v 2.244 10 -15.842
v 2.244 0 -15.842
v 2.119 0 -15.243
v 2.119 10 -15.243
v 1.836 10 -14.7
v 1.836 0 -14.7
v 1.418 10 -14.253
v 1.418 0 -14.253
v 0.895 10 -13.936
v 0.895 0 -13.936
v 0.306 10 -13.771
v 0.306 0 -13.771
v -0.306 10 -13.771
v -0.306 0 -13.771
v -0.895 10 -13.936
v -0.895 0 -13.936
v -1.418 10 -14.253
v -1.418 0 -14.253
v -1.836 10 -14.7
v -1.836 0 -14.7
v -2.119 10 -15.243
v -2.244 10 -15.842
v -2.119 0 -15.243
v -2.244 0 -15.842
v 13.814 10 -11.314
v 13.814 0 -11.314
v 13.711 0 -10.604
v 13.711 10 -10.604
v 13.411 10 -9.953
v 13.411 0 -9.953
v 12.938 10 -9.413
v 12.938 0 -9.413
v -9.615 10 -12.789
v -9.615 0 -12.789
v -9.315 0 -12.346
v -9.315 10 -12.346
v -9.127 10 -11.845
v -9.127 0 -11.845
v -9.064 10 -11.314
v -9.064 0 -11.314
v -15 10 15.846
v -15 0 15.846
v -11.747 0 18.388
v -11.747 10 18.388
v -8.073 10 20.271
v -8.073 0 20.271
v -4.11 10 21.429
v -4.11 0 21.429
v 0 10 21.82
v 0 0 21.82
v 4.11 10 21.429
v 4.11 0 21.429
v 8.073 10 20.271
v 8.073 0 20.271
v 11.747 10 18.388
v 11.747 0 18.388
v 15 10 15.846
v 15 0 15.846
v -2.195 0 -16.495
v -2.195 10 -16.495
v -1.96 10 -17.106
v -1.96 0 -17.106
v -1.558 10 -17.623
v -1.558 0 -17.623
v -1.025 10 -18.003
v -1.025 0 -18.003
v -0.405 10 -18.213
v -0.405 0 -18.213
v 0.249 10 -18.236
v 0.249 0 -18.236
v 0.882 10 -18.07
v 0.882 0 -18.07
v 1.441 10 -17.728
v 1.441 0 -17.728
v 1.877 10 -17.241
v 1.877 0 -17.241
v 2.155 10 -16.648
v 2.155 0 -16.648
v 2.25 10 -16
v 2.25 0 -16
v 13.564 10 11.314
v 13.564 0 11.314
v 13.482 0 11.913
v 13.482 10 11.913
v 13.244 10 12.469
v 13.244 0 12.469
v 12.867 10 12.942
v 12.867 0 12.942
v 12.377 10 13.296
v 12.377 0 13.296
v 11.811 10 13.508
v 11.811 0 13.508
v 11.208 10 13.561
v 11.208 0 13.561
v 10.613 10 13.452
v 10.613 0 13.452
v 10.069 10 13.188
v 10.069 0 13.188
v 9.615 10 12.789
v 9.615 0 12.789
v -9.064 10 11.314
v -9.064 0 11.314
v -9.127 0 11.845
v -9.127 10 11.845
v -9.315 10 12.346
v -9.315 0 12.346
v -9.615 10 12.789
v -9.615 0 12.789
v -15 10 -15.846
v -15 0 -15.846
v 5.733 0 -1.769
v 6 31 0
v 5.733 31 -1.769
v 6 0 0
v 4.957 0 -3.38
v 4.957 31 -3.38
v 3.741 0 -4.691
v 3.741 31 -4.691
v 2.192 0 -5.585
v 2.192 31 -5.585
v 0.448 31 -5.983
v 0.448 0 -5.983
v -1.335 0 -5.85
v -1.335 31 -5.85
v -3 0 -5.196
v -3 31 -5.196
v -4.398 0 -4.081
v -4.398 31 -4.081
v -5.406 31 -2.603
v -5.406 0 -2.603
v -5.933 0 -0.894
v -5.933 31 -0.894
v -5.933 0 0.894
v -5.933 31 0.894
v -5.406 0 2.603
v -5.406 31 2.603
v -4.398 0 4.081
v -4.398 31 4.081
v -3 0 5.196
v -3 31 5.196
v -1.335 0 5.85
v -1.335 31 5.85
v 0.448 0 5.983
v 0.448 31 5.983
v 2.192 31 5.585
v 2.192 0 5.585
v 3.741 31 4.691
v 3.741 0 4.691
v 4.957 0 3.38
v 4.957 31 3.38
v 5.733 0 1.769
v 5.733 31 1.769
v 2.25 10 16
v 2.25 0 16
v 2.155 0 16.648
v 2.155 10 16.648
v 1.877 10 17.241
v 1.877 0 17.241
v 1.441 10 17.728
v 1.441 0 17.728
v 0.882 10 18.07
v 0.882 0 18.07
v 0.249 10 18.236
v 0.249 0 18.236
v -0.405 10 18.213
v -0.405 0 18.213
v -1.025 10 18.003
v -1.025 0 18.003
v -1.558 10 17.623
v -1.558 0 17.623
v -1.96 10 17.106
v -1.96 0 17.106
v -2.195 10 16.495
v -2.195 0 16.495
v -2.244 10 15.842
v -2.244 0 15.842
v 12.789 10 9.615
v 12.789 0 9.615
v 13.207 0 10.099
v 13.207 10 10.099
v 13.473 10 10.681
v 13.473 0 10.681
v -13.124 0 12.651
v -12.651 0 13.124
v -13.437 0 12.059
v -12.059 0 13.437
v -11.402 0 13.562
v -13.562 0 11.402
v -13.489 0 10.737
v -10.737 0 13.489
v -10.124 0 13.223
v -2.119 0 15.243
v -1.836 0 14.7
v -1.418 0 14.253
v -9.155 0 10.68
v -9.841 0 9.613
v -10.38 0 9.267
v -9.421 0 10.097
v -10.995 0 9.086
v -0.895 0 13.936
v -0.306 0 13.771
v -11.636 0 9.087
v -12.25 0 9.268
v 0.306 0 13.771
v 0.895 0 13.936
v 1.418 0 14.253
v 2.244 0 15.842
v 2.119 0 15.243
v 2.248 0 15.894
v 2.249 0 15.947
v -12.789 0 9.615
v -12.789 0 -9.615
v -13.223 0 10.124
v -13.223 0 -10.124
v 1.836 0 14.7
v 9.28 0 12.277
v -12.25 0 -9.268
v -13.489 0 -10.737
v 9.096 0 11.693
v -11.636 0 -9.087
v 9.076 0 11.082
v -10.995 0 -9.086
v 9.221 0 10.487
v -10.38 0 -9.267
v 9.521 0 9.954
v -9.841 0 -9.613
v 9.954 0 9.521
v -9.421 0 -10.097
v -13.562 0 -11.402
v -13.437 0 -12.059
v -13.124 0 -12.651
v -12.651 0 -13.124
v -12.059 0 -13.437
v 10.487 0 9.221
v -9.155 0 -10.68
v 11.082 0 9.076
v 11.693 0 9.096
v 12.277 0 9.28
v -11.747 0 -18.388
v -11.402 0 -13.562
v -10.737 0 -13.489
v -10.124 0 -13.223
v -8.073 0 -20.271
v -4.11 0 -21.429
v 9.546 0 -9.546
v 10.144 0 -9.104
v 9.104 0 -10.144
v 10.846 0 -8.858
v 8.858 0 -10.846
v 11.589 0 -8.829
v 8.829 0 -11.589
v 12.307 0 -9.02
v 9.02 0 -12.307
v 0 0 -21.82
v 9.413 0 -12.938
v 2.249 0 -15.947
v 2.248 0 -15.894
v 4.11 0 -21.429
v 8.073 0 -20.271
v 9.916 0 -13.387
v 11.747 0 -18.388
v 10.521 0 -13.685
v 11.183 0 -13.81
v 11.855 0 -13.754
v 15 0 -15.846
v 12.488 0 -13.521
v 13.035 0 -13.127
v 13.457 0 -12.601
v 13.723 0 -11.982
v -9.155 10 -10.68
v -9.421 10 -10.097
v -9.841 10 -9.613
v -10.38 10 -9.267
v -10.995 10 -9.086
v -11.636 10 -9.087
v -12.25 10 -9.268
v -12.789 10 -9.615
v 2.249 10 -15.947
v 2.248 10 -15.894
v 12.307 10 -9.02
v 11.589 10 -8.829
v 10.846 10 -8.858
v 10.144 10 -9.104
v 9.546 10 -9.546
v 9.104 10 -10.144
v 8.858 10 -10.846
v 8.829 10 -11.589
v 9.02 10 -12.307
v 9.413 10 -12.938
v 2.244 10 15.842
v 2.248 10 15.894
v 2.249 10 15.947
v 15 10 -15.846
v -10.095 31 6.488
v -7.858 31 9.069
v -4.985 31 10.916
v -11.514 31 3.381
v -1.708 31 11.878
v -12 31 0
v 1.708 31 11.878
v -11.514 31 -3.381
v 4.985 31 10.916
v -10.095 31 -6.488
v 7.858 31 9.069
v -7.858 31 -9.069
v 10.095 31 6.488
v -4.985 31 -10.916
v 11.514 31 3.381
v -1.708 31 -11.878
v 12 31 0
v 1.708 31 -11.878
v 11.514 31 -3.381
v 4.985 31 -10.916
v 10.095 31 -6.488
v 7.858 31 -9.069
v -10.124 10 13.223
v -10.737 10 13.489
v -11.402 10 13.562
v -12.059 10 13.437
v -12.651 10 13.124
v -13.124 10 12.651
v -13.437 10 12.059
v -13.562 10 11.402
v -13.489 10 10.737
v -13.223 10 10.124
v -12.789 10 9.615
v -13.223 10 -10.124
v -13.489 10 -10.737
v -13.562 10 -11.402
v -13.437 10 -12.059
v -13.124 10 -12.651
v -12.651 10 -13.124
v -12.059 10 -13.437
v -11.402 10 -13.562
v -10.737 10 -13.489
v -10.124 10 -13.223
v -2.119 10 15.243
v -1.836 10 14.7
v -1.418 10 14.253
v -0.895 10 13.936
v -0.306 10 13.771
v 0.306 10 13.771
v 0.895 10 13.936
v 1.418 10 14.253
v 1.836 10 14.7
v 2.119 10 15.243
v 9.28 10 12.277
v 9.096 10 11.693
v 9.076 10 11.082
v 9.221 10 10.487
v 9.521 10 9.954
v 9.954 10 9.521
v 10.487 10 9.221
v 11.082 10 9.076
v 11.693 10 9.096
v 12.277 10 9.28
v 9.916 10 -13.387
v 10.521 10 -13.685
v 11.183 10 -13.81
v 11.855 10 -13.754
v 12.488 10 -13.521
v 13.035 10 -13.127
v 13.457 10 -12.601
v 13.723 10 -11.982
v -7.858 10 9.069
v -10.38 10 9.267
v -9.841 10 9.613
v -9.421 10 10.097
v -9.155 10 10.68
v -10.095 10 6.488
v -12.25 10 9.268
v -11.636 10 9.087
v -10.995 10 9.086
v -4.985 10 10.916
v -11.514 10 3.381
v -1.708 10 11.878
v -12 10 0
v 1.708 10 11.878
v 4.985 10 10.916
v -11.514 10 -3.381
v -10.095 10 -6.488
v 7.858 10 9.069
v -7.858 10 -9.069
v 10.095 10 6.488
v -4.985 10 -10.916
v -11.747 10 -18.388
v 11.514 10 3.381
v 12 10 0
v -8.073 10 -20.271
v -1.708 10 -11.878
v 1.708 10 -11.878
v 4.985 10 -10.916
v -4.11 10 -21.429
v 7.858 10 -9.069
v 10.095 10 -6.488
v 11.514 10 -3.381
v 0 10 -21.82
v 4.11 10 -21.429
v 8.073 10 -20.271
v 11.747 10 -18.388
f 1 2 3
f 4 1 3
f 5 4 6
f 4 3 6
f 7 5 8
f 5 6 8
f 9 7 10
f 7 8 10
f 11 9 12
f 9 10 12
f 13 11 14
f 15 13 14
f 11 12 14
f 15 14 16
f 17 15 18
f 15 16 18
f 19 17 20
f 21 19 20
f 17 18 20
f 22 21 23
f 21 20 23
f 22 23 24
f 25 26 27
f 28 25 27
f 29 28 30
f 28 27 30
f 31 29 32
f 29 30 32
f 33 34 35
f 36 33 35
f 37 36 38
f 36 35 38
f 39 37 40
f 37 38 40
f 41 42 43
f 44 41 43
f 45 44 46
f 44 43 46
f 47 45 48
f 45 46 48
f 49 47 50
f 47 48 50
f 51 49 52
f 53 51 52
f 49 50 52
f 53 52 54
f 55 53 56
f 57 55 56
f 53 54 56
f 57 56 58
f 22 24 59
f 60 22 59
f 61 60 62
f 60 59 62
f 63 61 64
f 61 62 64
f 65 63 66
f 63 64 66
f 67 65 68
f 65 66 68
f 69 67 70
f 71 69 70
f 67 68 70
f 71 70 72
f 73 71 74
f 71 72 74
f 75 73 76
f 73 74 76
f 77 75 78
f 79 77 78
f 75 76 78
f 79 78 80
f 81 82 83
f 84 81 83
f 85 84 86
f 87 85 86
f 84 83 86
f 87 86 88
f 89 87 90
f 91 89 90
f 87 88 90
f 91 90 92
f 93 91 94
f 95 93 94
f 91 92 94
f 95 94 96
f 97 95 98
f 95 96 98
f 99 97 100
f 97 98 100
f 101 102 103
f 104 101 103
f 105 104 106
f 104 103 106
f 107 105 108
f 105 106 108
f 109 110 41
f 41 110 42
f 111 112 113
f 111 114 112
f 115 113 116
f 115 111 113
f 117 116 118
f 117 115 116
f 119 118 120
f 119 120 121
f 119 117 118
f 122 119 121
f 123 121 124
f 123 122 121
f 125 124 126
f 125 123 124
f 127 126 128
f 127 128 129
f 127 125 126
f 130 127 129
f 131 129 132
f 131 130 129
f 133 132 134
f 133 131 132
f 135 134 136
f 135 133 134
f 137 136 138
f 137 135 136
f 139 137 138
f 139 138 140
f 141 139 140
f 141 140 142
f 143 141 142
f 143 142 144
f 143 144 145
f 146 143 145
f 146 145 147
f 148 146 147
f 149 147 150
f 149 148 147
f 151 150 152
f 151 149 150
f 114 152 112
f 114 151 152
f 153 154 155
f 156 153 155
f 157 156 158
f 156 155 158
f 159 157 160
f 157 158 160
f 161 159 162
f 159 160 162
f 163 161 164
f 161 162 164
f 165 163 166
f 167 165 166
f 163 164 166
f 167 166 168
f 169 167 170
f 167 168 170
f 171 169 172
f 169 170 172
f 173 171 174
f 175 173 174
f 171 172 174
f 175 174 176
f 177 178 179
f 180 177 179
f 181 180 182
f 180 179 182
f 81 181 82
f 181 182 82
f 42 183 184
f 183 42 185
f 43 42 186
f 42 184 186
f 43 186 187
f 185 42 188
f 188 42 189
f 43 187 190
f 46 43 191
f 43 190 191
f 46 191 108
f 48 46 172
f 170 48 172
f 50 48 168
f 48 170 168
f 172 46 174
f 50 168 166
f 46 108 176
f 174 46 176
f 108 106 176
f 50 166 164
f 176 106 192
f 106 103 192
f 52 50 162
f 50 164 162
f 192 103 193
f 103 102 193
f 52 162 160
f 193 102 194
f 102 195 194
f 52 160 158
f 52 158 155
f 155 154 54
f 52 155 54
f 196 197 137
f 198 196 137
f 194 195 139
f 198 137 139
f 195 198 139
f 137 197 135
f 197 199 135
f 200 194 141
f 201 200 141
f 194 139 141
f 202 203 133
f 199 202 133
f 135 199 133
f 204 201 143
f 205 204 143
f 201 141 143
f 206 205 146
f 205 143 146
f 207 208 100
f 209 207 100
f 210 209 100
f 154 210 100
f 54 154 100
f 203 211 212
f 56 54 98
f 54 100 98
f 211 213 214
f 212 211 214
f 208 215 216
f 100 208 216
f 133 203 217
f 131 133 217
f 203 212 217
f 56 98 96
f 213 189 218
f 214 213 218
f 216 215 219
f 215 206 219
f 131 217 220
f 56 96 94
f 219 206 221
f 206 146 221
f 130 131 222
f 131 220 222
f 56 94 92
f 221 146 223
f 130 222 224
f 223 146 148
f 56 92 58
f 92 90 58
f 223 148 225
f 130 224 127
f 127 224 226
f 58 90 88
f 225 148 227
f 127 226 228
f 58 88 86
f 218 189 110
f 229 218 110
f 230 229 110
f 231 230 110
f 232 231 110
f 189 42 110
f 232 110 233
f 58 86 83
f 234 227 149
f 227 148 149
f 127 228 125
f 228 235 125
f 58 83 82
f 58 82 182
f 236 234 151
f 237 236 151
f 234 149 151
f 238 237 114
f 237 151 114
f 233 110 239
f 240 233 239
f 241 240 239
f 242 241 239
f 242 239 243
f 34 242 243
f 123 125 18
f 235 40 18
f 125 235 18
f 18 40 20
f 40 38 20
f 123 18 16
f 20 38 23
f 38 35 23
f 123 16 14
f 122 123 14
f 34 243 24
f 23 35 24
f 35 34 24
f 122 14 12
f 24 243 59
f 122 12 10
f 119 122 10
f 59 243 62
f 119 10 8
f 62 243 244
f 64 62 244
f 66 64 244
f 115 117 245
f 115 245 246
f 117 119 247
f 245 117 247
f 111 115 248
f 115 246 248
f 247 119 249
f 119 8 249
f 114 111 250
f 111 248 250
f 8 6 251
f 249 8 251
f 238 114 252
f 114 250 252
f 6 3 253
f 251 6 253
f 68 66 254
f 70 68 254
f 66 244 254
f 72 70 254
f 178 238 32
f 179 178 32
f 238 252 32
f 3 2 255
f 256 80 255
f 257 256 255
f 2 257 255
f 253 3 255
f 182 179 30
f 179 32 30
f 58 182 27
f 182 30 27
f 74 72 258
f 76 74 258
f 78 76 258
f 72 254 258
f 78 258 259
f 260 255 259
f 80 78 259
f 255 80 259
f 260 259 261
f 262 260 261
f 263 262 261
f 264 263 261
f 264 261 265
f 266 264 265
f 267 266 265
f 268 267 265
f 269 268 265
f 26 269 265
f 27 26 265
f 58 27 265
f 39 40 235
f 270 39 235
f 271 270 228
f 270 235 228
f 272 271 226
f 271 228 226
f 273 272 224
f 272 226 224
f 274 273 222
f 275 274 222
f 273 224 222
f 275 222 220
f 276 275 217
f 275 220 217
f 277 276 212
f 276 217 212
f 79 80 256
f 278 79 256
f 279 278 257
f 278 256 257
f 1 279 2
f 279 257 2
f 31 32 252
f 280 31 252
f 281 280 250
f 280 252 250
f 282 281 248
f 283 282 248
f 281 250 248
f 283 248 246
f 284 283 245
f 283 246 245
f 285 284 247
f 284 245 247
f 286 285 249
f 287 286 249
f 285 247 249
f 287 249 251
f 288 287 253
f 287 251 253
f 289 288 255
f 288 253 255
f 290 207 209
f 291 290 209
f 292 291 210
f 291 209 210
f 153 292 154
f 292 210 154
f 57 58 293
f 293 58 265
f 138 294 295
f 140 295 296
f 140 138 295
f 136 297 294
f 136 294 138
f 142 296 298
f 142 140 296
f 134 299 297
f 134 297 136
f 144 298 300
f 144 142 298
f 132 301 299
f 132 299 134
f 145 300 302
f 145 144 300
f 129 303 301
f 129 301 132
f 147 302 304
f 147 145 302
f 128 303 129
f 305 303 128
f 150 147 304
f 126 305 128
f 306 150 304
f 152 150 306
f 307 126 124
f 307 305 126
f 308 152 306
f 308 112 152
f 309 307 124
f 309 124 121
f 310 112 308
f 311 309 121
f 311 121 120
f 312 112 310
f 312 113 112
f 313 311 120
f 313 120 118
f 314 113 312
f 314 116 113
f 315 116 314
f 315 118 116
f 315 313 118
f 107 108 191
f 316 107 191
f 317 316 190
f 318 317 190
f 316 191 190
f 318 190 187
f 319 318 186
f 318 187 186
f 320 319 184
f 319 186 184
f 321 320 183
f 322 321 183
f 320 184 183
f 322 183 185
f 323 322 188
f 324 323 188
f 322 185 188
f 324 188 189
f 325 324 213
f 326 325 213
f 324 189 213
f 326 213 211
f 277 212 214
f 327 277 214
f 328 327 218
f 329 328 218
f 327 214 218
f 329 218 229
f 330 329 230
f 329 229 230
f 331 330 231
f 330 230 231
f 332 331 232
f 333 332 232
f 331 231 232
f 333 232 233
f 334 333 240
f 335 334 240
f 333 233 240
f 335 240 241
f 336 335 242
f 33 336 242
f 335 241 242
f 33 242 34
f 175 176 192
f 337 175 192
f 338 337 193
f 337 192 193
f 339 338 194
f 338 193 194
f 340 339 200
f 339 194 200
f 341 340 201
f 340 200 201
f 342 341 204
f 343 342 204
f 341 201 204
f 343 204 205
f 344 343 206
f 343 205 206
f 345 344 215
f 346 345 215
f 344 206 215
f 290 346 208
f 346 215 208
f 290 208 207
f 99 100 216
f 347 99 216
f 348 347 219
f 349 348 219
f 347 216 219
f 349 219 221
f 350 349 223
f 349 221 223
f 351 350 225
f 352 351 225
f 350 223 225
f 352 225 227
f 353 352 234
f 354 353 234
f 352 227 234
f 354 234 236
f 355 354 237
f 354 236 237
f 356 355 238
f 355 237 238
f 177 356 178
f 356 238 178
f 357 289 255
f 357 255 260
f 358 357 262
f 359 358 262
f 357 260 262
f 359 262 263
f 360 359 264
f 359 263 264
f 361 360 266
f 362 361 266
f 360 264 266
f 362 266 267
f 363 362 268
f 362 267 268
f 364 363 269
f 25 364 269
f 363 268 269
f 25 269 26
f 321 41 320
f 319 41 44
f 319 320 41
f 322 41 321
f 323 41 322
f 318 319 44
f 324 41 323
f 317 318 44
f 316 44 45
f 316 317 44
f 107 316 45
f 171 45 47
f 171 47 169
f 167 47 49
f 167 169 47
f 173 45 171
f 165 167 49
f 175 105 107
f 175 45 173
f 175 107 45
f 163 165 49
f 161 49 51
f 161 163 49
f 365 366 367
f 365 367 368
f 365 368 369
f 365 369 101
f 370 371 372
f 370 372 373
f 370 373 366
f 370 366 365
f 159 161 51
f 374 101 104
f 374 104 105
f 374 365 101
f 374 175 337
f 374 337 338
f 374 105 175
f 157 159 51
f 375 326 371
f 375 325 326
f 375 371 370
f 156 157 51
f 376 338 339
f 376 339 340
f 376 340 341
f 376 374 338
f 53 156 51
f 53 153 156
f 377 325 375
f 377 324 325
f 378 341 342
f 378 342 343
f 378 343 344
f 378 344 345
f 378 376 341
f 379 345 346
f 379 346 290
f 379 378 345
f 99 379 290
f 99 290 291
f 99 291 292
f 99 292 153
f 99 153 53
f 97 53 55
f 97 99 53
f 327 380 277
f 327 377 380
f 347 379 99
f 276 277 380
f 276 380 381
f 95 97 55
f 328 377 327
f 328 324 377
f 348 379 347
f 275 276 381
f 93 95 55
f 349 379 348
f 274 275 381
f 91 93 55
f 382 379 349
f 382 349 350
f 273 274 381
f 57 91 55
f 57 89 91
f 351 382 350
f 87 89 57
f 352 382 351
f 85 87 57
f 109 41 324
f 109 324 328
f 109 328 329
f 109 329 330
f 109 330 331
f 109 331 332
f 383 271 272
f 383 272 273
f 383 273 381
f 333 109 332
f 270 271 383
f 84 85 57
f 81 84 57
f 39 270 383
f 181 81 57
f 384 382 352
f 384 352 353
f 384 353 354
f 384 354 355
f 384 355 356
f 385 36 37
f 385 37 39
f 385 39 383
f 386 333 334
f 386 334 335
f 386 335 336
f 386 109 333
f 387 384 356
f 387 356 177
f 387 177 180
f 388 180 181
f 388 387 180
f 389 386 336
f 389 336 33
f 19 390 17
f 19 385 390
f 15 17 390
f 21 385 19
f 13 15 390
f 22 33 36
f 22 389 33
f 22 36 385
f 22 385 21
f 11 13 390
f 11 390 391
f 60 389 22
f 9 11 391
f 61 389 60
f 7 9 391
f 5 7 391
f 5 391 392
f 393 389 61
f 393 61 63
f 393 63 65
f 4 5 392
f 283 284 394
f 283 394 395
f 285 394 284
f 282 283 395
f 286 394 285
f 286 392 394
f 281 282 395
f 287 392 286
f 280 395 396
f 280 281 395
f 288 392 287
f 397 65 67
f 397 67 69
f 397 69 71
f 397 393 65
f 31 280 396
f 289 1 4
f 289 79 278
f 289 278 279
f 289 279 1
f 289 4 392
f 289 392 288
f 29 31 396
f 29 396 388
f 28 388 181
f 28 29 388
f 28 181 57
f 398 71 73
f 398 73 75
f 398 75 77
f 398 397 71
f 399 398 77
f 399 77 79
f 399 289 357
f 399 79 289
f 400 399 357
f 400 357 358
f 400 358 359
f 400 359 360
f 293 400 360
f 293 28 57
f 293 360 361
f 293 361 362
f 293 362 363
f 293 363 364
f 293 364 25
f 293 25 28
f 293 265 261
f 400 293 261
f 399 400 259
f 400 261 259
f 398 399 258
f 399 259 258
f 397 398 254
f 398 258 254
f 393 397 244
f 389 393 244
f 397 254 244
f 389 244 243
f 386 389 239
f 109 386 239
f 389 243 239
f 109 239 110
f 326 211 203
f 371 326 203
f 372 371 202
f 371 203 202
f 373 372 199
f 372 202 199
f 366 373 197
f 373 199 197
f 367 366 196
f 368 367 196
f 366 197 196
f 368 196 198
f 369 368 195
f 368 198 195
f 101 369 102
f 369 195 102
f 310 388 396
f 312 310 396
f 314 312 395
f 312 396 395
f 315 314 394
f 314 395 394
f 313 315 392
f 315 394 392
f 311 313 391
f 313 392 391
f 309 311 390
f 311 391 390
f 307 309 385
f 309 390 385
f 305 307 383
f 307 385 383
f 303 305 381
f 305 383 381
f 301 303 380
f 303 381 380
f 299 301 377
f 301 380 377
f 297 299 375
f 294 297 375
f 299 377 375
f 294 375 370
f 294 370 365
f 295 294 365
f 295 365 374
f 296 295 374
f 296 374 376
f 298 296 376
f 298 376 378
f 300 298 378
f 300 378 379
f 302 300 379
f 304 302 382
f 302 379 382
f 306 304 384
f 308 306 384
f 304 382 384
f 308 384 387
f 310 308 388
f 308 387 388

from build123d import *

# Parameters (mm, degrees)
SKETCH_1_R      = 6
EXTRUDE_1_DEPTH = 10
SKETCH_3_R      = 12
SKETCH_3_R_2    = 6
EXTRUDE_2_DEPTH = 21


with BuildPart() as part:
    # 草图1 → 凸台-拉伸1 (new body)
    with BuildSketch(Plane(origin=(0, 0, 0), x_dir=(1, 0, 0), z_dir=(0, 1, 0))):
        with BuildLine():
            ThreePointArc((-12.788894575, 9.614789418), (-14.041020916, 7.671357874), (-15, 5.567764363))
            Line((-15, 5.567764363), (-15, -5.567764363))
            ThreePointArc((-15, -5.567764363), (-14.041020916, -7.671357874), (-12.788894575, -9.614789418))
            ThreePointArc((-12.788894575, -9.614789418), (-10.380078131, -9.26655576), (-9.063708499, -11.313708499))
            ThreePointArc((-9.063708499, -11.313708499), (-9.205976551, -12.101087718), (-9.614789418, -12.788894575))
            ThreePointArc((-9.614789418, -12.788894575), (-6.122934918, -14.78207252), (-2.24443128, -15.841796875))
            ThreePointArc((-2.24443128, -15.841796875), (0, -13.75), (2.24443128, -15.841796875))
            ThreePointArc((2.24443128, -15.841796875), (6.122934918, -14.78207252), (9.614789418, -12.788894575))
            ThreePointArc((9.614789418, -12.788894575), (9.722718241, -9.722718241), (12.788894575, -9.614789418))
            ThreePointArc((12.788894575, -9.614789418), (14.041020916, -7.671357874), (15, -5.567764363))
            Line((15, -5.567764363), (15, 5.567764363))
            ThreePointArc((15, 5.567764363), (14.100687822, 7.561124451), (12.937965605, 9.413237806))
            ThreePointArc((12.937965605, 9.413237806), (9.545941546, 9.545941546), (9.413237806, 12.937965605))
            ThreePointArc((9.413237806, 12.937965605), (6.006943578, 14.829586267), (2.24443128, 15.841796875))
            ThreePointArc((2.24443128, 15.841796875), (0, 13.75), (-2.24443128, 15.841796875))
            ThreePointArc((-2.24443128, 15.841796875), (-6.122934918, 14.78207252), (-9.614789418, 12.788894575))
            ThreePointArc((-9.614789418, 12.788894575), (-9.205976551, 12.101087718), (-9.063708499, 11.313708499))
            ThreePointArc((-9.063708499, 11.313708499), (-10.380078131, 9.26655576), (-12.788894575, 9.614789418))
        make_face()
        Circle(SKETCH_1_R, mode=Mode.SUBTRACT)
        with BuildLine():
            Line((-15, -5.567764363), (-15, -15.84625977))
            ThreePointArc((-15, -15.84625977), (0, -21.819806339), (15, -15.84625977))
            Line((15, -15.84625977), (15, -5.567764363))
            ThreePointArc((15, -5.567764363), (14.041020916, -7.671357874), (12.788894575, -9.614789418))
            ThreePointArc((12.788894575, -9.614789418), (13.360861238, -10.380078131), (13.563708499, -11.313708499))
            ThreePointArc((13.563708499, -11.313708499), (12.101087718, -13.421440447), (9.614789418, -12.788894575))
            ThreePointArc((9.614789418, -12.788894575), (6.122934918, -14.78207252), (2.24443128, -15.841796875))
            ThreePointArc((2.24443128, -15.841796875), (2.248607389, -15.920849448), (2.25, -16))
            ThreePointArc((2.25, -16), (-0.079150552, -18.248607389), (-2.24443128, -15.841796875))
            ThreePointArc((-2.24443128, -15.841796875), (-6.122934918, -14.78207252), (-9.614789418, -12.788894575))
            ThreePointArc((-9.614789418, -12.788894575), (-12.904698757, -12.904698757), (-12.788894575, -9.614789418))
            ThreePointArc((-12.788894575, -9.614789418), (-14.041020916, -7.671357874), (-15, -5.567764363))
        make_face()
        with BuildLine():
            ThreePointArc((15, 15.84625977), (0, 21.819806339), (-15, 15.84625977))
            Line((-15, 15.84625977), (-15, 5.567764363))
            ThreePointArc((-15, 5.567764363), (-14.041020916, 7.671357874), (-12.788894575, 9.614789418))
            ThreePointArc((-12.788894575, 9.614789418), (-12.904698757, 12.904698757), (-9.614789418, 12.788894575))
            ThreePointArc((-9.614789418, 12.788894575), (-6.122934918, 14.78207252), (-2.24443128, 15.841796875))
            ThreePointArc((-2.24443128, 15.841796875), (-0.079150552, 18.248607389), (2.25, 16))
            ThreePointArc((2.25, 16), (2.248607389, 15.920849448), (2.24443128, 15.841796875))
            ThreePointArc((2.24443128, 15.841796875), (6.006943578, 14.829586267), (9.413237806, 12.937965605))
            ThreePointArc((9.413237806, 12.937965605), (12.179394143, 13.659041816), (13.813708499, 11.313708499))
            ThreePointArc((13.813708499, 11.313708499), (13.584241781, 10.267439596), (12.937965605, 9.413237806))
            ThreePointArc((12.937965605, 9.413237806), (14.100687822, 7.561124451), (15, 5.567764363))
            Line((15, 5.567764363), (15, 15.84625977))
        make_face()
    extrude(amount=EXTRUDE_1_DEPTH)

    # 草图3 → 凸台-拉伸2 (add)
    with BuildSketch(Plane(origin=(0, 10, 0), x_dir=(1, 0, 0), z_dir=(0, 1, 0))):
        Circle(SKETCH_3_R)
        Circle(SKETCH_3_R_2, mode=Mode.SUBTRACT)
    extrude(amount=EXTRUDE_2_DEPTH)


solid = part.part
